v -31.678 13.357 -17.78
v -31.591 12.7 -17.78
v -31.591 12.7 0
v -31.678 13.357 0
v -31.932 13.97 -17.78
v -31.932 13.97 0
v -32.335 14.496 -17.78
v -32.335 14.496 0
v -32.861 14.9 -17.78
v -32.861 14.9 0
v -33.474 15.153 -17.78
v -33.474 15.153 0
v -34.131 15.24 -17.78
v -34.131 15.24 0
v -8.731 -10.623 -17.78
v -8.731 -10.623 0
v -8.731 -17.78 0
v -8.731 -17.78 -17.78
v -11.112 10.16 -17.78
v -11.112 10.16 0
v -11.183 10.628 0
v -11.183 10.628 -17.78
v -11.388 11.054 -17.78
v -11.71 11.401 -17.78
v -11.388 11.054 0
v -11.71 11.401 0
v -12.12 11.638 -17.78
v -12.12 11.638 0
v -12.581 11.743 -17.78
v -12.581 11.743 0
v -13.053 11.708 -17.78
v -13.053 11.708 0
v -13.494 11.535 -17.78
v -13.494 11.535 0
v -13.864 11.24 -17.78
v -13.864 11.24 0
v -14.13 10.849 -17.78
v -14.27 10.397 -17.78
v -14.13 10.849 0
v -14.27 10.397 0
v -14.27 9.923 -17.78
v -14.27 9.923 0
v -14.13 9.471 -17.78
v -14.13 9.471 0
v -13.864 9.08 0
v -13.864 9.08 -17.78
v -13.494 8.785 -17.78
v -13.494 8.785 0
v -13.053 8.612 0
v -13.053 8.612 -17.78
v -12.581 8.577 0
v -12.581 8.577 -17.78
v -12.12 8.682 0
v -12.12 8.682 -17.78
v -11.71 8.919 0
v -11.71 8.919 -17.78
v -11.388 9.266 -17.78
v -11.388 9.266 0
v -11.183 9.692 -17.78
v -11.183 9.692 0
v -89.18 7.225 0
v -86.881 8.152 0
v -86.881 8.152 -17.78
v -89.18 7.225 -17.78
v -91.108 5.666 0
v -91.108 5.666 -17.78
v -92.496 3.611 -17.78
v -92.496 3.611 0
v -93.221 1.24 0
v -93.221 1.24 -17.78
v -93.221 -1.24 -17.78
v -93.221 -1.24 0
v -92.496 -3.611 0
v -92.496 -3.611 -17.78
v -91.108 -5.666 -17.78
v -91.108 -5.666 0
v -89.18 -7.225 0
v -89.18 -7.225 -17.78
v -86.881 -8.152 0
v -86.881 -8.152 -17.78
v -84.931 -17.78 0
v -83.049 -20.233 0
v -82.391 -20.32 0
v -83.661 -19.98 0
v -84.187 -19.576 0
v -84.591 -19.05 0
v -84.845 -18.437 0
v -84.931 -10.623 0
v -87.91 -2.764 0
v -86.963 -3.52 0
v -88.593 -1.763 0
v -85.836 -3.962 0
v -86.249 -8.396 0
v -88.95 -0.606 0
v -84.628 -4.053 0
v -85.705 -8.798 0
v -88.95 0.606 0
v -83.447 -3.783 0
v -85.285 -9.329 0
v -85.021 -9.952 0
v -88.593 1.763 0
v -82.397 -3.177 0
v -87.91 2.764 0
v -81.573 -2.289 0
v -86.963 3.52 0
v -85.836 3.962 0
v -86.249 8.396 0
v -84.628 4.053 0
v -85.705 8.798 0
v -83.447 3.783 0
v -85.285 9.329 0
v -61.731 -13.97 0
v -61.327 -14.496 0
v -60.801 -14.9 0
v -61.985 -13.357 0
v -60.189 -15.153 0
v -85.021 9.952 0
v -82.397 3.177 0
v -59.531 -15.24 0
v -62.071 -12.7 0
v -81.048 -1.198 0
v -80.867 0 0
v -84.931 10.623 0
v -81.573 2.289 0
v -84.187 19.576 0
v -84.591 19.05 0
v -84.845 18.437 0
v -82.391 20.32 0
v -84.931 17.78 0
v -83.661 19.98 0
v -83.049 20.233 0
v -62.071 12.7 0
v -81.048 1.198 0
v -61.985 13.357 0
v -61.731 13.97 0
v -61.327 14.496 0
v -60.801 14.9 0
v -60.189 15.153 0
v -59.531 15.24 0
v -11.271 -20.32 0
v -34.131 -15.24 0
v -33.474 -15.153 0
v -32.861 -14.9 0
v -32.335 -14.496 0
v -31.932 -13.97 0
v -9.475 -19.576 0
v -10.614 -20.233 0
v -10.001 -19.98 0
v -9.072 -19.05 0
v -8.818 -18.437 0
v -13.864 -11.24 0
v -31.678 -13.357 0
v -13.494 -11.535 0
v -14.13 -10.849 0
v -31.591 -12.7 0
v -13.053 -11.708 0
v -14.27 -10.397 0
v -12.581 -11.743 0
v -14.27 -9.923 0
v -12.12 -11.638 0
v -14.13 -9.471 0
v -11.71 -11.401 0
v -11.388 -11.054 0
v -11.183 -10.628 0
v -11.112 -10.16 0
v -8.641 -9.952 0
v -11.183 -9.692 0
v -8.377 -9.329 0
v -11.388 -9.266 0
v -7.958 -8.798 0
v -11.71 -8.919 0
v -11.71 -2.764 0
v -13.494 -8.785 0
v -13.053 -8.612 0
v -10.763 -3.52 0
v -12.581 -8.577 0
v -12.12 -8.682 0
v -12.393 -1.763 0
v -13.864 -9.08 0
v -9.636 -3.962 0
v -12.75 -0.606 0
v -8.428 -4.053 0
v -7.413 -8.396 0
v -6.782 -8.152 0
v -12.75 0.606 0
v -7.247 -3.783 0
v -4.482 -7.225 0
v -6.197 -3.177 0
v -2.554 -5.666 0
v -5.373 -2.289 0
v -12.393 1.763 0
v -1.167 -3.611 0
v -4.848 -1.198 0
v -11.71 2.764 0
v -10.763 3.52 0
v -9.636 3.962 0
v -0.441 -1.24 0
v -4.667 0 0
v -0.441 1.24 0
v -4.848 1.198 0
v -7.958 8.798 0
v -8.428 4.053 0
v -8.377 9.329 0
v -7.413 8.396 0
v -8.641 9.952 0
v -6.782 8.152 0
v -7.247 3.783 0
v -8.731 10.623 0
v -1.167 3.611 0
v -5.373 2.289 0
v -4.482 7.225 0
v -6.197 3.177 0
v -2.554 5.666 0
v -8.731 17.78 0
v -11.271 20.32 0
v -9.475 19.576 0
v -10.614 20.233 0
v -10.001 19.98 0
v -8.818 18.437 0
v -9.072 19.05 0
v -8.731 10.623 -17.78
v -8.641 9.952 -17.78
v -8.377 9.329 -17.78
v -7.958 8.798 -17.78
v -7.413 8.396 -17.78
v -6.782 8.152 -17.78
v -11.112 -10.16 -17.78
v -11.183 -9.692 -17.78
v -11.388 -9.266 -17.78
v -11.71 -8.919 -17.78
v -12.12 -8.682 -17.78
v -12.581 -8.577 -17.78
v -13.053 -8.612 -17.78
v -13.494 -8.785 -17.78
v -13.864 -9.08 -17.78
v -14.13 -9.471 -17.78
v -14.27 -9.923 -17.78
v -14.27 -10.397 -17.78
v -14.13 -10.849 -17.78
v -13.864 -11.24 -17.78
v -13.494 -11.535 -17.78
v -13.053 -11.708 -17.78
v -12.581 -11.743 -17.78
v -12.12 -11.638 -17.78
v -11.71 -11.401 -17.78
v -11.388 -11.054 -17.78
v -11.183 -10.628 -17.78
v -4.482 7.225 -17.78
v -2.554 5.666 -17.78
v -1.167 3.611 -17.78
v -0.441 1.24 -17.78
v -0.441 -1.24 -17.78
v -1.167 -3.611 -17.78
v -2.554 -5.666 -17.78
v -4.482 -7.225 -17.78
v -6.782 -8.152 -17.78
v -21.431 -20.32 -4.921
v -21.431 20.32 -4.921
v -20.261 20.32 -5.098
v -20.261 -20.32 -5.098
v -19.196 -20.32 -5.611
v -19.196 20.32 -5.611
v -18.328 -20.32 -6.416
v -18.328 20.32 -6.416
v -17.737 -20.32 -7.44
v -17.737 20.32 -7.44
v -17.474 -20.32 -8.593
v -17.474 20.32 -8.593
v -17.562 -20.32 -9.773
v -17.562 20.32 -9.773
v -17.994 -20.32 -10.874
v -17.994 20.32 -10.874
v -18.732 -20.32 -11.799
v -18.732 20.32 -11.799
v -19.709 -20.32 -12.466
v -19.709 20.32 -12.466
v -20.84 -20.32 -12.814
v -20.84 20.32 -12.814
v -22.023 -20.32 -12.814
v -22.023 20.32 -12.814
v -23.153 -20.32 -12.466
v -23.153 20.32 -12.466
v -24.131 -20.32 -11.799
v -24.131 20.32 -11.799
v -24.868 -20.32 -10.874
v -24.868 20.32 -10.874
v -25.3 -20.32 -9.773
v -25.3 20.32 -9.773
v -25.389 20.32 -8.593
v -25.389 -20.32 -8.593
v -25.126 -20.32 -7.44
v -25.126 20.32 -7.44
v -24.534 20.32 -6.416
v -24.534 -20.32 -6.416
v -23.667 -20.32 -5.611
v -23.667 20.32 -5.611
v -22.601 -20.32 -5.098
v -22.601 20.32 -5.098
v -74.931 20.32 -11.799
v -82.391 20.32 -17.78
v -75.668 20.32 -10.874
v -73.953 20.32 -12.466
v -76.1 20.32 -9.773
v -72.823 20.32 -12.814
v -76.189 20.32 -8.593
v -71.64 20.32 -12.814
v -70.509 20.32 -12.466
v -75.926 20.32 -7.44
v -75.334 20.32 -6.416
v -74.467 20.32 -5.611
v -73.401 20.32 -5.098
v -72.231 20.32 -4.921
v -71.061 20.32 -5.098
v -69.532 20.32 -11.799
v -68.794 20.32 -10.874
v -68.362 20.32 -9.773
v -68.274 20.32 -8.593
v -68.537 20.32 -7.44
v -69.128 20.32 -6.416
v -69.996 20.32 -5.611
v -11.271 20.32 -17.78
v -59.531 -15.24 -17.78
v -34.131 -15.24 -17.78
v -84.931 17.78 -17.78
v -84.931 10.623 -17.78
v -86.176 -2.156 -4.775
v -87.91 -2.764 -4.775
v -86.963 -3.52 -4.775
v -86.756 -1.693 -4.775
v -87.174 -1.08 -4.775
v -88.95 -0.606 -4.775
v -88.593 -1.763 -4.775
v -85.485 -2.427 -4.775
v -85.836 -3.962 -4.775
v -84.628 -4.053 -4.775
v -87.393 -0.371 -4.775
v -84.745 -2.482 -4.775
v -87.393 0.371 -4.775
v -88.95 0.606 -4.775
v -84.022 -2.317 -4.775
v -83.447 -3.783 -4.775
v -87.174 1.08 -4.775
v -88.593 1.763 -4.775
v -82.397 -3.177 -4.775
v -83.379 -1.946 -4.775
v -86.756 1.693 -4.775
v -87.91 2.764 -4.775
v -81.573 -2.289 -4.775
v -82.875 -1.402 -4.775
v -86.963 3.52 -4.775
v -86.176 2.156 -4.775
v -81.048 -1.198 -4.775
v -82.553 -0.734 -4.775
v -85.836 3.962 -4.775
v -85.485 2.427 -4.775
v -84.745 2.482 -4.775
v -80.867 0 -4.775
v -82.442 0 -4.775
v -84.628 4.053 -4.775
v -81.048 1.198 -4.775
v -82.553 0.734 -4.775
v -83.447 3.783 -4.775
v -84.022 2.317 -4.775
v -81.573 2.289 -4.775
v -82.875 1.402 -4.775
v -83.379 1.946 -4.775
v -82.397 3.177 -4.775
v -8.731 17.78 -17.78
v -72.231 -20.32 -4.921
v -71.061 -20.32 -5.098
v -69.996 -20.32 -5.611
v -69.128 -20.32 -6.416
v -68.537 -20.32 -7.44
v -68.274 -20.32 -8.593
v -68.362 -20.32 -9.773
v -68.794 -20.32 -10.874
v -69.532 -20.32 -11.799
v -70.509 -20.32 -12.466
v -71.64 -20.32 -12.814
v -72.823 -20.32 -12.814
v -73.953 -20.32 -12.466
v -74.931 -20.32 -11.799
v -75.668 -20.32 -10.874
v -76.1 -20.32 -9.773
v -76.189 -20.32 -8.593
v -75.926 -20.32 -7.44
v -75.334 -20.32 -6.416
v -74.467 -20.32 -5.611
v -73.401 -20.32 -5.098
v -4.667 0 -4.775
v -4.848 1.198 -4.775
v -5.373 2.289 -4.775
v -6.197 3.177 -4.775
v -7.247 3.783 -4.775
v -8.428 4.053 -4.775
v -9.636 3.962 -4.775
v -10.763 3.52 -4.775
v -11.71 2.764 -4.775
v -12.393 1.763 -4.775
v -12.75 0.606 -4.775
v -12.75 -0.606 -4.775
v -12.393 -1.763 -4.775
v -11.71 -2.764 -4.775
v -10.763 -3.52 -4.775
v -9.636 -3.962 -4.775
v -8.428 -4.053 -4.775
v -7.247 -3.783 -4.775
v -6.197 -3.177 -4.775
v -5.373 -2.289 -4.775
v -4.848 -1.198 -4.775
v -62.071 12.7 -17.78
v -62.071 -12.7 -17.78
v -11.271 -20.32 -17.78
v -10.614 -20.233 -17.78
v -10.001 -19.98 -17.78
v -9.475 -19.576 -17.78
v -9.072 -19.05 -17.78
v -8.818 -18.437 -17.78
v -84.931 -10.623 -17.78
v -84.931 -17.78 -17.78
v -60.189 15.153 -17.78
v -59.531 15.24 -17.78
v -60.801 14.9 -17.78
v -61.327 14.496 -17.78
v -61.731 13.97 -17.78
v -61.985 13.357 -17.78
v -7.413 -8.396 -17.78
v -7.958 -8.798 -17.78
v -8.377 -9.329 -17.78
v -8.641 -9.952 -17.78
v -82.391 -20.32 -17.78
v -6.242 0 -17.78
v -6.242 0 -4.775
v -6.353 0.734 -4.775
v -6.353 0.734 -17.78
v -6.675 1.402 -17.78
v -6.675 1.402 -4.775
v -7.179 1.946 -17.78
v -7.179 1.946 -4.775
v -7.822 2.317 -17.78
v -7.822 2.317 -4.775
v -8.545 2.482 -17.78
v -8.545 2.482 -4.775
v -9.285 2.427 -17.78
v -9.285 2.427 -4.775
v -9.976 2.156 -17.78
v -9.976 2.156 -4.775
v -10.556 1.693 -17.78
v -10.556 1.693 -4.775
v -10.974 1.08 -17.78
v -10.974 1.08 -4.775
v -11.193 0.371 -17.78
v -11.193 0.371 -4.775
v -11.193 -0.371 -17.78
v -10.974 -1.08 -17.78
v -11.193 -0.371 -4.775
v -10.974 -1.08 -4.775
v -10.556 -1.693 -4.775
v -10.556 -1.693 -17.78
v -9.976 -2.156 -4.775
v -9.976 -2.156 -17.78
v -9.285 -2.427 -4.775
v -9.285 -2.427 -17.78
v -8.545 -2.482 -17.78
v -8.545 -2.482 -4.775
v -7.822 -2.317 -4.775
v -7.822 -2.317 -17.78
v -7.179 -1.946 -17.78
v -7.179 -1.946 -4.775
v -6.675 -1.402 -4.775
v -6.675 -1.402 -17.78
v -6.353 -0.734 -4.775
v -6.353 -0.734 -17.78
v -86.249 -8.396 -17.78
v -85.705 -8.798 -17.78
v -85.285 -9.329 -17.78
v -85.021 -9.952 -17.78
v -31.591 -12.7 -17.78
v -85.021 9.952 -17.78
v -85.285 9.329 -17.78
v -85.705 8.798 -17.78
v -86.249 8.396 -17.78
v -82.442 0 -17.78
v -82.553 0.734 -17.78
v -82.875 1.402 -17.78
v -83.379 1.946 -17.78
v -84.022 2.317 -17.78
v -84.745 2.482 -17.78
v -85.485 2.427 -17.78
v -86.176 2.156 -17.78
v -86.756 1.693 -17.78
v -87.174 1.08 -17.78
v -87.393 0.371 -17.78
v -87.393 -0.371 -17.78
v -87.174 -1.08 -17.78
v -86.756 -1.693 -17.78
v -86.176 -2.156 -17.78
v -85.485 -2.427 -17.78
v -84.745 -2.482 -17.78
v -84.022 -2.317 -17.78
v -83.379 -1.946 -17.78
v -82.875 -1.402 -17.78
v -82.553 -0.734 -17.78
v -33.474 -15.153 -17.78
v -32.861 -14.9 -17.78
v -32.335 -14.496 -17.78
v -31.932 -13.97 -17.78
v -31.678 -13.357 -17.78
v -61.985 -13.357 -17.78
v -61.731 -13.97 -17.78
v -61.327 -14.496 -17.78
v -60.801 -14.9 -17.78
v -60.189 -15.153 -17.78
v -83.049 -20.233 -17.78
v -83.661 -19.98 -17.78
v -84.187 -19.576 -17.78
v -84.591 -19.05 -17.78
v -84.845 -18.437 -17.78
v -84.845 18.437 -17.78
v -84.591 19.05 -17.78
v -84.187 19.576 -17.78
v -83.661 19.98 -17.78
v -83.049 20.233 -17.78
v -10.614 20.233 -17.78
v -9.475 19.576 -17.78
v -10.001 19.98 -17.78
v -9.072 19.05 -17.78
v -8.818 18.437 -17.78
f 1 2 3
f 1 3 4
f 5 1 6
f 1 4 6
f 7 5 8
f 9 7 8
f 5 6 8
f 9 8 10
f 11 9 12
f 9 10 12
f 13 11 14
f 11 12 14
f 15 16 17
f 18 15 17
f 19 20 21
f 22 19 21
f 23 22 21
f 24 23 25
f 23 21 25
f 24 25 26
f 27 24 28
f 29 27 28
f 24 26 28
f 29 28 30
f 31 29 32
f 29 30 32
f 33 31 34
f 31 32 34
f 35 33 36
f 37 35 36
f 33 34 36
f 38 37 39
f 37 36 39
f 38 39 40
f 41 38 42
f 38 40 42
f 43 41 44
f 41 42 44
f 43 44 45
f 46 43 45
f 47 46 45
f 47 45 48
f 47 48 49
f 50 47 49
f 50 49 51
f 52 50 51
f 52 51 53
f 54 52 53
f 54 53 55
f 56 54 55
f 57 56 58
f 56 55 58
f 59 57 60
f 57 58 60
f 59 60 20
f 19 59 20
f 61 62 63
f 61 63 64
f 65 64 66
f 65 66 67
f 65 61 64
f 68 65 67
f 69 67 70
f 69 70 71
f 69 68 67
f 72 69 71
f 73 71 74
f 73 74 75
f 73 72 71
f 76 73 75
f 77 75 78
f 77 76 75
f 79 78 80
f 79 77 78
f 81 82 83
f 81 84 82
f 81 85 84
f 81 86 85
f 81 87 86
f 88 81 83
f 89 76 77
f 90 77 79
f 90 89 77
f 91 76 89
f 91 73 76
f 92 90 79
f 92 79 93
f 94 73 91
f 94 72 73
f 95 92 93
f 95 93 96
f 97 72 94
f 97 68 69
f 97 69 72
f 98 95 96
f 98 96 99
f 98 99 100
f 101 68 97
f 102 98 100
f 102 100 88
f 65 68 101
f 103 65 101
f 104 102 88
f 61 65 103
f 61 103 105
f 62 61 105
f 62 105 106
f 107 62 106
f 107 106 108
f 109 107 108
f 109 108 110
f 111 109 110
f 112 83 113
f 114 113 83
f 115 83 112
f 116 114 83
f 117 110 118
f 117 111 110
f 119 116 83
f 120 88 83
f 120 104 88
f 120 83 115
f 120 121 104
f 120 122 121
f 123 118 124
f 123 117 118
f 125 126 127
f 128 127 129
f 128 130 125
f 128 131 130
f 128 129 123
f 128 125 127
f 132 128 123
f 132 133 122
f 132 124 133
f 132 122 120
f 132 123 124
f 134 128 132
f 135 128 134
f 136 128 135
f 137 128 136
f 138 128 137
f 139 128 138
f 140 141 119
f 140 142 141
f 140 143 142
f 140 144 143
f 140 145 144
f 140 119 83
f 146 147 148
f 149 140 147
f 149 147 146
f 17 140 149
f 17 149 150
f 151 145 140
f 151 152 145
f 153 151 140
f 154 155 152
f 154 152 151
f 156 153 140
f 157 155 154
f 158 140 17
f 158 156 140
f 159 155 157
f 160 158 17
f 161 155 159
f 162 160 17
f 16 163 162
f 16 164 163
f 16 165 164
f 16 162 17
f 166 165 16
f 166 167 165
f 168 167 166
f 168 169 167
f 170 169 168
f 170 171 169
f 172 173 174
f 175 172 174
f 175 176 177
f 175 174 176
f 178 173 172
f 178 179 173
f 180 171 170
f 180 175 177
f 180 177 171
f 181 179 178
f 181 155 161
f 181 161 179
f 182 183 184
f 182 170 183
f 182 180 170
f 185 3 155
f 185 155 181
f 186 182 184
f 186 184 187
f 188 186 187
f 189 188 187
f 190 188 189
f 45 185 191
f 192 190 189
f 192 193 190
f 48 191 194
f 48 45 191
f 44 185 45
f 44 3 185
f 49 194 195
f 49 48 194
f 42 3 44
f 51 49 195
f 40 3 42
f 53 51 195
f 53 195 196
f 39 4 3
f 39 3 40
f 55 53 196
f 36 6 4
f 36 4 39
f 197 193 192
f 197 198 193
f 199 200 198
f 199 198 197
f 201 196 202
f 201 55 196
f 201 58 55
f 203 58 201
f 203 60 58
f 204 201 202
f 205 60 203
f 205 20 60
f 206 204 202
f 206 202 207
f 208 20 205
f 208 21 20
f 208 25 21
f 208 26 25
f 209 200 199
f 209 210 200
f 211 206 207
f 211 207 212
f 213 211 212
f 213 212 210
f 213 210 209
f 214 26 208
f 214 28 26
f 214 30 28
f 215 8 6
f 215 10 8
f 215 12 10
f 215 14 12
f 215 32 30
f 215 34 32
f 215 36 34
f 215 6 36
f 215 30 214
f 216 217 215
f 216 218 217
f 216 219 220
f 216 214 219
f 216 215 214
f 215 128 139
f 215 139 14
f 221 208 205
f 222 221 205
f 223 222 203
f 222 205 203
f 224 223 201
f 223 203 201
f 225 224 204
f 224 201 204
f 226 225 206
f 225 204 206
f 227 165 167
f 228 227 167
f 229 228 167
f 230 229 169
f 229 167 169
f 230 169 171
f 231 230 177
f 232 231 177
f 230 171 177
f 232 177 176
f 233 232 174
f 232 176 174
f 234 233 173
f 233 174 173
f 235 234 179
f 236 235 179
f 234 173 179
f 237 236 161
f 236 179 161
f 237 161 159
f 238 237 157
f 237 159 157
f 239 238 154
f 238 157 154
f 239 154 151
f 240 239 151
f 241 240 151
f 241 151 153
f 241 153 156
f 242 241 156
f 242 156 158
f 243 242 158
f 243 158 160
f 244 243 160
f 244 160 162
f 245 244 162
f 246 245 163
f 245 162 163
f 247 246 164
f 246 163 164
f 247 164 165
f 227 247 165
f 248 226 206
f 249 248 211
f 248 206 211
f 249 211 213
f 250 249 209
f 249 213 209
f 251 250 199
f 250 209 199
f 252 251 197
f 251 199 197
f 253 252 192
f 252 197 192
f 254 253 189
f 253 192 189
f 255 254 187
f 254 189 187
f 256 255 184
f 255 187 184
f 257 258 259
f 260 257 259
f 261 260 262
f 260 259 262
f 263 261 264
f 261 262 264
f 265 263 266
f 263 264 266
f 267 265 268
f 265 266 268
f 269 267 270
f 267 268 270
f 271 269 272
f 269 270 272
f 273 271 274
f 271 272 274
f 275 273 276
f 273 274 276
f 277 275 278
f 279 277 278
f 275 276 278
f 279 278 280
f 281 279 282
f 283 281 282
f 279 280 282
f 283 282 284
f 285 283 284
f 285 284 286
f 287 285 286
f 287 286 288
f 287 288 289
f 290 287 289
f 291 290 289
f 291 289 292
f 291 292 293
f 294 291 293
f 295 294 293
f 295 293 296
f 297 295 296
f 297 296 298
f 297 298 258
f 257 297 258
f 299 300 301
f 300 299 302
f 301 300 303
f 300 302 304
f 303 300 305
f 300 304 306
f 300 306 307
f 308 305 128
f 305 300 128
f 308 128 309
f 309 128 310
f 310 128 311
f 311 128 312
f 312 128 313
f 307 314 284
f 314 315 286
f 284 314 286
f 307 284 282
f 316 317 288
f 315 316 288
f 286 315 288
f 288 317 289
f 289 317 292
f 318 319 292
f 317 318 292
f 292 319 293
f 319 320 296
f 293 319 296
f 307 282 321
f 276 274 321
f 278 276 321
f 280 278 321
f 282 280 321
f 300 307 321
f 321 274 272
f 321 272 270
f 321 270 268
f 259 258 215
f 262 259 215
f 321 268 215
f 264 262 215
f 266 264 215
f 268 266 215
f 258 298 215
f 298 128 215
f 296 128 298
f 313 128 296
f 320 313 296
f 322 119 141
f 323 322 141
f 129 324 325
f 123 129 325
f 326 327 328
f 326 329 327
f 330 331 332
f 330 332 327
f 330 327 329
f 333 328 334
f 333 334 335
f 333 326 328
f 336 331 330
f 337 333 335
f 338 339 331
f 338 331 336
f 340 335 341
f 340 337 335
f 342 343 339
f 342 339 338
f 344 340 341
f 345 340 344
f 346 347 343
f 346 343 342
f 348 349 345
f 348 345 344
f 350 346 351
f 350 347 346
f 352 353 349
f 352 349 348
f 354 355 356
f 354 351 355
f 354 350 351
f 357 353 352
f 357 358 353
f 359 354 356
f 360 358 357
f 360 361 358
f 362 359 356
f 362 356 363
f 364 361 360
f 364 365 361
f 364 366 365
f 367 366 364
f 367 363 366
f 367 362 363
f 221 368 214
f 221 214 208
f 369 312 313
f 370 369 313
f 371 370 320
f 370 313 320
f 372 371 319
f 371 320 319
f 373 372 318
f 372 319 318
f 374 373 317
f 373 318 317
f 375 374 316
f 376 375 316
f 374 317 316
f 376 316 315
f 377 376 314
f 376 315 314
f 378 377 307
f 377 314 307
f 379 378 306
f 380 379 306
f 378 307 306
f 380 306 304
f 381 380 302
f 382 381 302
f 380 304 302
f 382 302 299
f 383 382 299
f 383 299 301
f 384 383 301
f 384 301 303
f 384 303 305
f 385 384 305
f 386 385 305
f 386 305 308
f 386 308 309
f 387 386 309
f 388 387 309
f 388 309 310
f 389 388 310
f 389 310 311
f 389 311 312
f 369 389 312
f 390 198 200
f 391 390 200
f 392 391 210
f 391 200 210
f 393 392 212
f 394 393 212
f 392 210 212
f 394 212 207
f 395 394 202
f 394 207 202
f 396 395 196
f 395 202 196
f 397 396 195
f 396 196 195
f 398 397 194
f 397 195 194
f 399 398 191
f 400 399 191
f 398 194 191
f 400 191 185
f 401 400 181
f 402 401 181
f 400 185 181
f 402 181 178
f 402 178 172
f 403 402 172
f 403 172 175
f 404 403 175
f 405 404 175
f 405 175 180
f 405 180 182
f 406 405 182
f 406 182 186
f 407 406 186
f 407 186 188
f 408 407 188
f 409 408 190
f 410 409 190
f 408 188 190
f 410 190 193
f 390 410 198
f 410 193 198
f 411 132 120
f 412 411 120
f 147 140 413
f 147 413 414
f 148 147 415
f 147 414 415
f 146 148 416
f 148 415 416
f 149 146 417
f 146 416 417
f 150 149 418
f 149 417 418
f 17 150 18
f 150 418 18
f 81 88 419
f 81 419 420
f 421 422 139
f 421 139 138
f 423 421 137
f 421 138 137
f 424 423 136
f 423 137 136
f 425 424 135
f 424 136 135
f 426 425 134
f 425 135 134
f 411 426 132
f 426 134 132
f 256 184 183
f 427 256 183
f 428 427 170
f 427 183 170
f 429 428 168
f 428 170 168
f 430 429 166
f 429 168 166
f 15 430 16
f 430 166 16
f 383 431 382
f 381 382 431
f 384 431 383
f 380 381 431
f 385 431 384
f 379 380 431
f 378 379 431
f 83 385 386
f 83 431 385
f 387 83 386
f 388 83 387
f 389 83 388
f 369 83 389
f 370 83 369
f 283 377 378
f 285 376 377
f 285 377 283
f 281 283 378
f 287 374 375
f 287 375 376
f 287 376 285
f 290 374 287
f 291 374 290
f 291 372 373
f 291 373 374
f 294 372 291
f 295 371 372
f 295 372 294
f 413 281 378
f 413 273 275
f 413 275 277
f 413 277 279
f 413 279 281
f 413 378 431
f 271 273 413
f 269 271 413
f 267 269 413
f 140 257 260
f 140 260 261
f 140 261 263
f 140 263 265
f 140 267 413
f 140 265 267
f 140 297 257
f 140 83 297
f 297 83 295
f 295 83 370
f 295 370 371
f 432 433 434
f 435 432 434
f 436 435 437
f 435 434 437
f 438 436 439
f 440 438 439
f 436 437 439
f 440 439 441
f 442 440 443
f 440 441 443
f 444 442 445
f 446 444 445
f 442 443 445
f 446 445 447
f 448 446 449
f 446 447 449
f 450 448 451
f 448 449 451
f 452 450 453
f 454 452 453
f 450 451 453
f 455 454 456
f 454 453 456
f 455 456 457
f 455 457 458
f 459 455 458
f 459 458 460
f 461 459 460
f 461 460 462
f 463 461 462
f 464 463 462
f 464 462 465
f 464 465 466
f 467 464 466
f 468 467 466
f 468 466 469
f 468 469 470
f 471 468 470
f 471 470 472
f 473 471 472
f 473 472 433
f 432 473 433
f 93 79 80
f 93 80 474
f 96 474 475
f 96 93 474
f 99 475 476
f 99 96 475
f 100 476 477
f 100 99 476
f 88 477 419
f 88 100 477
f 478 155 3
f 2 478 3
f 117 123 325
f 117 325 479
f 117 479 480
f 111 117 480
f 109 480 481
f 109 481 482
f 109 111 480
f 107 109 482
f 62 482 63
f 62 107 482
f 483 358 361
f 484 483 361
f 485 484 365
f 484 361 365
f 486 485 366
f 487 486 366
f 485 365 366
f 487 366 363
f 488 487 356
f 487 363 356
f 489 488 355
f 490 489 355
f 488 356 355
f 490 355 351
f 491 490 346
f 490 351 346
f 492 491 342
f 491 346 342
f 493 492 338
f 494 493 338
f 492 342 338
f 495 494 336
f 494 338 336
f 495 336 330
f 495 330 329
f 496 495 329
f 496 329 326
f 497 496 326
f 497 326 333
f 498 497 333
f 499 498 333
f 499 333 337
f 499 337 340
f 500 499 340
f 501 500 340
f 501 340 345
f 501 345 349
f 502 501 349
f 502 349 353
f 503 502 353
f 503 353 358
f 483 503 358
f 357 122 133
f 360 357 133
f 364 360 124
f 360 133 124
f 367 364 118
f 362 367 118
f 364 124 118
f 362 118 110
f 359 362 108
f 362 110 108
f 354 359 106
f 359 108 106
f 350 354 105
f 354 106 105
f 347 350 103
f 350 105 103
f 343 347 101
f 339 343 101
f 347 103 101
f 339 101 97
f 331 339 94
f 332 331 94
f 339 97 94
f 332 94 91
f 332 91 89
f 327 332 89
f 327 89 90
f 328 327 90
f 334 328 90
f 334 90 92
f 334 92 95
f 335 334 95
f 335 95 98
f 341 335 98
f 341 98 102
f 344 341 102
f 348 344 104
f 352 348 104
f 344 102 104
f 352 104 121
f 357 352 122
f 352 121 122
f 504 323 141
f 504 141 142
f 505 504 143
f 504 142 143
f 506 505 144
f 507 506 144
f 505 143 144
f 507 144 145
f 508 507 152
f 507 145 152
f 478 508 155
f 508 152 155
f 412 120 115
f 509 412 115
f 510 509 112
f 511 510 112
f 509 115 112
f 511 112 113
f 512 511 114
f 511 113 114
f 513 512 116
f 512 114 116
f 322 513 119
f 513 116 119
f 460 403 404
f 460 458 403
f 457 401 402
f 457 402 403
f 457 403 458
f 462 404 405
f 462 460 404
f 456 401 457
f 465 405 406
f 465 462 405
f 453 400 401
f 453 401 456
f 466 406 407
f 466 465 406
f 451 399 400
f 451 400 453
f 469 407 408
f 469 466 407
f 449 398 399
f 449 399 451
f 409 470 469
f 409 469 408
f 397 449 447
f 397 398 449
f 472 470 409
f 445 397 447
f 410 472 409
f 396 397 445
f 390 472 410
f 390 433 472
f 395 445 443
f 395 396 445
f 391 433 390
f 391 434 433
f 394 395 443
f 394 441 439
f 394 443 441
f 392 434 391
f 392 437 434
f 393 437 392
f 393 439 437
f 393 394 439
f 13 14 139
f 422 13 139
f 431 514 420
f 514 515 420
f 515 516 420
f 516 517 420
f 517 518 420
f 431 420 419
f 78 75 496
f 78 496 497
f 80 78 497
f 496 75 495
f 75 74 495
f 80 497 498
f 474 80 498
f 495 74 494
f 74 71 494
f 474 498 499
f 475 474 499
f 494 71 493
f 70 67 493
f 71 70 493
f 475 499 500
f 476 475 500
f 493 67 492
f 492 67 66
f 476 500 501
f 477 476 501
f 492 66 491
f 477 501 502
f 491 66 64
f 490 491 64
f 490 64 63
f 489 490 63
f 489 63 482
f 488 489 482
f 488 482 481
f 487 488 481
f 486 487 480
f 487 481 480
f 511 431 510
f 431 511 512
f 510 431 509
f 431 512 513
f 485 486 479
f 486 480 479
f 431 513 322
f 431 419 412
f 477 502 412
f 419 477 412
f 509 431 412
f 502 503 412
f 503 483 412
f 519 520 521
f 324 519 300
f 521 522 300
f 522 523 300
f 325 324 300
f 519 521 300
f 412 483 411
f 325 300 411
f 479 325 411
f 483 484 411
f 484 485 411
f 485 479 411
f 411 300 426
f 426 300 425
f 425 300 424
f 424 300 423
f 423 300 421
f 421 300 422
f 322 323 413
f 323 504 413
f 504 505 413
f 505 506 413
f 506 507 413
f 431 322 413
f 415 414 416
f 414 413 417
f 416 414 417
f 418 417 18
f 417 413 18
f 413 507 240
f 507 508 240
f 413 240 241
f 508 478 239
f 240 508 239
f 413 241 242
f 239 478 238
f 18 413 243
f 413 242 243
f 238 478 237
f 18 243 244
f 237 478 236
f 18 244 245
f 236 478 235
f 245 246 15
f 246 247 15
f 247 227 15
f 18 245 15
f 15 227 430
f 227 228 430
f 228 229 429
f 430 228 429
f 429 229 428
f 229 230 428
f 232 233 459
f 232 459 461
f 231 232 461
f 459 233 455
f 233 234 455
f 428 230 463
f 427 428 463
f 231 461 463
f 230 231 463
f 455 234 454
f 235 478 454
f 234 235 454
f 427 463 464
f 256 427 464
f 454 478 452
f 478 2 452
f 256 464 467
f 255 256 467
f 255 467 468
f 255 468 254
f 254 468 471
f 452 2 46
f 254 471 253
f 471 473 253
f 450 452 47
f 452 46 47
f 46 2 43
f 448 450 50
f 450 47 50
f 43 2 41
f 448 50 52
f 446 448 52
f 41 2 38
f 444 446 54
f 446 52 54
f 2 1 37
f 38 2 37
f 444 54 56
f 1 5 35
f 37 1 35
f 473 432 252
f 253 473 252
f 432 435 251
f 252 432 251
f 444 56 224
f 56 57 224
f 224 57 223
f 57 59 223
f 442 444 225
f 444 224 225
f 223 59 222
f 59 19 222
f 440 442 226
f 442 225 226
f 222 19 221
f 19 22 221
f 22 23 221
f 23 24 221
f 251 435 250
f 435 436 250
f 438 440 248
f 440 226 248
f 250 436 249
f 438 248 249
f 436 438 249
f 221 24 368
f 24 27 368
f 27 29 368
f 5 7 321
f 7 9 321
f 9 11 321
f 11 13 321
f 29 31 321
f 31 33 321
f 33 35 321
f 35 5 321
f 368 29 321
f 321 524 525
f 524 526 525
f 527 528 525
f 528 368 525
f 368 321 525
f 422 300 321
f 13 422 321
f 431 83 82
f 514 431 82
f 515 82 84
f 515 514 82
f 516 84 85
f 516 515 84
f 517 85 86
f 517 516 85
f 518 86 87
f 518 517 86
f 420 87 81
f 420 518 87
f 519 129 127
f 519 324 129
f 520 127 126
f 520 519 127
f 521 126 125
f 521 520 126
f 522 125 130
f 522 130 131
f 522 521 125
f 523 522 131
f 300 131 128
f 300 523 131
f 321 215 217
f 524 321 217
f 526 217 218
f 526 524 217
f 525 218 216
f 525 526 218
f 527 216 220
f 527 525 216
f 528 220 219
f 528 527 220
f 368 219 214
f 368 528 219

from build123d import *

# Parameters (mm, degrees)
SKETCH1_W           = 93.6625
SKETCH1_H           = 40.64
SKETCH1_R           = 2.4892
SKETCH1_R_2         = 1.5875
BOSS_EXTRUDE1_DEPTH = 17.78
SKETCH6_R           = 3.96875
CUT_EXTRUDE4_DEPTH  = 104.635910312
CUT_EXTRUDE3_DEPTH  = 17.78
FILLET1_R           = 2.54
SKETCH3_R           = 4.064
CUT_EXTRUDE5_DEPTH  = 4.7752
CUT_EXTRUDE6_DEPTH  = 98.141100599


with BuildPart() as part:
    # Sketch1 → Boss-Extrude1 (new body)
    with BuildSketch(Plane.XY):
        with Locations((-46.83125, 0)):
            Rectangle(SKETCH1_W, SKETCH1_H)
        with Locations((-84.93125, 0)):
            Circle(SKETCH1_R, mode=Mode.SUBTRACT)
        with Locations((-8.73125, 0)):
            Circle(SKETCH1_R, mode=Mode.SUBTRACT)
        with Locations((-12.7, 10.16)):
            Circle(SKETCH1_R_2, mode=Mode.SUBTRACT)
        with Locations((-12.7, -10.16)):
            Circle(SKETCH1_R_2, mode=Mode.SUBTRACT)
    extrude(amount=-BOSS_EXTRUDE1_DEPTH)

    # Sketch6 → Cut-Extrude4 (cut, through all)
    with BuildSketch(Plane(origin=(0, 20.32, 0), x_dir=(1, 0, 0), z_dir=(0, 1, 0))):
        with Locations(Location((-72.23125, 8.89, 0), (0, 0, 270))):
            Circle(SKETCH6_R)
        with Locations(Location((-21.43125, 8.89, 0), (0, 0, 270))):
            Circle(SKETCH6_R)
    extrude(amount=-CUT_EXTRUDE4_DEPTH, mode=Mode.SUBTRACT)

    # Sketch5 → Cut-Extrude3 (cut)
    with BuildSketch(Plane.XY):
        with BuildLine():
            Line((-93.6625, -20.32), (-93.6625, 20.32))
            Line((-93.6625, 20.32), (-84.93125, 20.32))
            Line((-84.93125, 20.32), (-84.93125, 10.622546022))
            ThreePointArc((-84.93125, 10.622546022), (-85.477262526, 9.049137635), (-86.880552326, 8.152186482))
            ThreePointArc((-86.880552326, 8.152186482), (-93.31325, 0), (-86.880552326, -8.152186482))
            ThreePointArc((-86.880552326, -8.152186482), (-85.477262526, -9.049137635), (-84.93125, -10.622546022))
            Line((-84.93125, -10.622546022), (-84.93125, -20.32))
            Line((-84.93125, -20.32), (-93.6625, -20.32))
        make_face()
        with BuildLine():
            Line((0, -20.32), (0, 20.32))
            Line((0, 20.32), (-8.73125, 20.32))
            Line((-8.73125, 20.32), (-8.73125, 10.622546022))
            ThreePointArc((-8.73125, 10.622546022), (-8.185237474, 9.049137635), (-6.781947674, 8.152186482))
            ThreePointArc((-6.781947674, 8.152186482), (-0.34925, 0), (-6.781947674, -8.152186482))
            ThreePointArc((-6.781947674, -8.152186482), (-8.185237474, -9.049137635), (-8.73125, -10.622546022))
            Line((-8.73125, -10.622546022), (-8.73125, -20.32))
            Line((-8.73125, -20.32), (0, -20.32))
        make_face()
    extrude(amount=-CUT_EXTRUDE3_DEPTH, mode=Mode.SUBTRACT)

    # Fillet1
    fillet1_edges = [part.edges().sort_by_distance(p)[0] for p in [
        (-84.93125, 20.32, -8.89),
        (-84.93125, -20.32, -8.89),
        (-8.73125, 20.32, -8.89),
        (-8.73125, -20.32, -8.89),
    ]]
    fillet(fillet1_edges, radius=FILLET1_R)

    # Sketch3 → Cut-Extrude5 (cut)
    with BuildSketch(Plane.XY):
        with Locations((-84.93125, 0)):
            Circle(SKETCH3_R)
        with Locations((-8.73125, 0)):
            Circle(SKETCH3_R)
    extrude(amount=-CUT_EXTRUDE5_DEPTH, mode=Mode.SUBTRACT)

    # Sketch7 → Cut-Extrude6 (cut, through all)
    with BuildSketch(Plane.XY):
        with BuildLine():
            Line((-59.53125, -15.24), (-34.13125, -15.24))
            ThreePointArc((-34.13125, -15.24), (-32.335198776, -14.496051224), (-31.59125, -12.7))
            Line((-31.59125, -12.7), (-31.59125, 12.7))
            ThreePointArc((-31.59125, 12.7), (-32.335198776, 14.496051224), (-34.13125, 15.24))
            Line((-34.13125, 15.24), (-59.53125, 15.24))
            ThreePointArc((-59.53125, 15.24), (-61.327301224, 14.496051224), (-62.07125, 12.7))
            Line((-62.07125, 12.7), (-62.07125, -12.7))
            ThreePointArc((-62.07125, -12.7), (-61.327301224, -14.496051224), (-59.53125, -15.24))
        make_face()
    extrude(amount=-CUT_EXTRUDE6_DEPTH, mode=Mode.SUBTRACT)


solid = part.part
